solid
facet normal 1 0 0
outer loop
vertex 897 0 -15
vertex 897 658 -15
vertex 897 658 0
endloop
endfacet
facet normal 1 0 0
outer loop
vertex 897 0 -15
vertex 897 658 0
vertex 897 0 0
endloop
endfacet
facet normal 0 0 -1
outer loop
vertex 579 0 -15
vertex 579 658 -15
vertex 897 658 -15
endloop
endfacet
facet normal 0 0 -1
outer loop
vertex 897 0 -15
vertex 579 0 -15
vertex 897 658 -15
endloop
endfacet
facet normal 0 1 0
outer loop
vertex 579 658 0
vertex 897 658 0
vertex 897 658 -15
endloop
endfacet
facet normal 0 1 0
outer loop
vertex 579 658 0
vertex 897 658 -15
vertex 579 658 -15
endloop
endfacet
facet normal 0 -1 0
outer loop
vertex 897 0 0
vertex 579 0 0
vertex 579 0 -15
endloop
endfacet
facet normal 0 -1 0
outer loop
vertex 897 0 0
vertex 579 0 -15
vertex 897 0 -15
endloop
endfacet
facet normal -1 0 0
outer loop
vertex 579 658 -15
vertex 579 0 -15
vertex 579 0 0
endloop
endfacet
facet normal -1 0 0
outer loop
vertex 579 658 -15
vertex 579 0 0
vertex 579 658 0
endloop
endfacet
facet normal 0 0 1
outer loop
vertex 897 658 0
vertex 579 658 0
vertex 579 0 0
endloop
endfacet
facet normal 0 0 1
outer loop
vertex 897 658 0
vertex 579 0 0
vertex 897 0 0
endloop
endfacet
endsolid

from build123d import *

# Parameters (mm, degrees)
TABAN_FLAN_1_DEPTH         = 15
KES_EKSTR_ZYON1_DEPTH      = 2129.448495971
KES_EKSTR_ZYON1_DEPTH_BACK = 2129.448495971
IZIM3_W                    = 642
IZIM3_H                    = 505
KES_EKSTR_ZYON2_DEPTH      = 1807.166658977
KES_EKSTR_ZYON2_DEPTH_BACK = 1807.166658977
IZIM4_W                    = 37
IZIM4_H                    = 345
IZIM4_W_2                  = 7
IZIM4_H_2                  = 658
KES_EKSTR_ZYON3_DEPTH      = 1113.563706041
KES_EKSTR_ZYON3_DEPTH_BACK = 1113.563706041
IZIM5_W                    = 572
IZIM5_H                    = 658


# Sheet-metal steps are written as plain solids
with BuildPart() as part:
    # Çizim1 → Taban-Flanş1 (new body)
    with BuildSketch(Plane.XY):
        Polygon((0, 0), (1502, 0), (1502, 1508), (860, 1508), (860, 658), (0, 658), align=None)
    extrude(amount=-TABAN_FLAN_1_DEPTH)

    # Çizim3 → Kes-Ekstrüzyon1 (cut, two sides: drawn at the far end of the back side and taken through both)
    with BuildSketch(Plane.XY.offset(-KES_EKSTR_ZYON1_DEPTH_BACK)):
        with Locations((1181, 1255.5)):
            Rectangle(IZIM3_W, IZIM3_H)
    extrude(amount=KES_EKSTR_ZYON1_DEPTH + KES_EKSTR_ZYON1_DEPTH_BACK, mode=Mode.SUBTRACT)

    # Çizim4 → Kes-Ekstrüzyon2 (cut, two sides: drawn at the far end of the back side and taken through both)
    with BuildSketch(Plane.XY.offset(-KES_EKSTR_ZYON2_DEPTH_BACK)):
        Polygon((1502, 0), (1502, 1003), (897, 1003), (897, 658), (897, 0), align=None)
        with Locations((878.5, 830.5)):
            Rectangle(IZIM4_W, IZIM4_H)
        with Locations((3.5, 329)):
            Rectangle(IZIM4_W_2, IZIM4_H_2)
    extrude(amount=KES_EKSTR_ZYON2_DEPTH + KES_EKSTR_ZYON2_DEPTH_BACK, mode=Mode.SUBTRACT)

    # Çizim5 → Kes-Ekstrüzyon3 (cut, two sides: drawn at the far end of the back side and taken through both)
    with BuildSketch(Plane.XY.offset(-KES_EKSTR_ZYON3_DEPTH_BACK)):
        with Locations((293, 329)):
            Rectangle(IZIM5_W, IZIM5_H)
    extrude(amount=KES_EKSTR_ZYON3_DEPTH + KES_EKSTR_ZYON3_DEPTH_BACK, mode=Mode.SUBTRACT)


solid = part.part
